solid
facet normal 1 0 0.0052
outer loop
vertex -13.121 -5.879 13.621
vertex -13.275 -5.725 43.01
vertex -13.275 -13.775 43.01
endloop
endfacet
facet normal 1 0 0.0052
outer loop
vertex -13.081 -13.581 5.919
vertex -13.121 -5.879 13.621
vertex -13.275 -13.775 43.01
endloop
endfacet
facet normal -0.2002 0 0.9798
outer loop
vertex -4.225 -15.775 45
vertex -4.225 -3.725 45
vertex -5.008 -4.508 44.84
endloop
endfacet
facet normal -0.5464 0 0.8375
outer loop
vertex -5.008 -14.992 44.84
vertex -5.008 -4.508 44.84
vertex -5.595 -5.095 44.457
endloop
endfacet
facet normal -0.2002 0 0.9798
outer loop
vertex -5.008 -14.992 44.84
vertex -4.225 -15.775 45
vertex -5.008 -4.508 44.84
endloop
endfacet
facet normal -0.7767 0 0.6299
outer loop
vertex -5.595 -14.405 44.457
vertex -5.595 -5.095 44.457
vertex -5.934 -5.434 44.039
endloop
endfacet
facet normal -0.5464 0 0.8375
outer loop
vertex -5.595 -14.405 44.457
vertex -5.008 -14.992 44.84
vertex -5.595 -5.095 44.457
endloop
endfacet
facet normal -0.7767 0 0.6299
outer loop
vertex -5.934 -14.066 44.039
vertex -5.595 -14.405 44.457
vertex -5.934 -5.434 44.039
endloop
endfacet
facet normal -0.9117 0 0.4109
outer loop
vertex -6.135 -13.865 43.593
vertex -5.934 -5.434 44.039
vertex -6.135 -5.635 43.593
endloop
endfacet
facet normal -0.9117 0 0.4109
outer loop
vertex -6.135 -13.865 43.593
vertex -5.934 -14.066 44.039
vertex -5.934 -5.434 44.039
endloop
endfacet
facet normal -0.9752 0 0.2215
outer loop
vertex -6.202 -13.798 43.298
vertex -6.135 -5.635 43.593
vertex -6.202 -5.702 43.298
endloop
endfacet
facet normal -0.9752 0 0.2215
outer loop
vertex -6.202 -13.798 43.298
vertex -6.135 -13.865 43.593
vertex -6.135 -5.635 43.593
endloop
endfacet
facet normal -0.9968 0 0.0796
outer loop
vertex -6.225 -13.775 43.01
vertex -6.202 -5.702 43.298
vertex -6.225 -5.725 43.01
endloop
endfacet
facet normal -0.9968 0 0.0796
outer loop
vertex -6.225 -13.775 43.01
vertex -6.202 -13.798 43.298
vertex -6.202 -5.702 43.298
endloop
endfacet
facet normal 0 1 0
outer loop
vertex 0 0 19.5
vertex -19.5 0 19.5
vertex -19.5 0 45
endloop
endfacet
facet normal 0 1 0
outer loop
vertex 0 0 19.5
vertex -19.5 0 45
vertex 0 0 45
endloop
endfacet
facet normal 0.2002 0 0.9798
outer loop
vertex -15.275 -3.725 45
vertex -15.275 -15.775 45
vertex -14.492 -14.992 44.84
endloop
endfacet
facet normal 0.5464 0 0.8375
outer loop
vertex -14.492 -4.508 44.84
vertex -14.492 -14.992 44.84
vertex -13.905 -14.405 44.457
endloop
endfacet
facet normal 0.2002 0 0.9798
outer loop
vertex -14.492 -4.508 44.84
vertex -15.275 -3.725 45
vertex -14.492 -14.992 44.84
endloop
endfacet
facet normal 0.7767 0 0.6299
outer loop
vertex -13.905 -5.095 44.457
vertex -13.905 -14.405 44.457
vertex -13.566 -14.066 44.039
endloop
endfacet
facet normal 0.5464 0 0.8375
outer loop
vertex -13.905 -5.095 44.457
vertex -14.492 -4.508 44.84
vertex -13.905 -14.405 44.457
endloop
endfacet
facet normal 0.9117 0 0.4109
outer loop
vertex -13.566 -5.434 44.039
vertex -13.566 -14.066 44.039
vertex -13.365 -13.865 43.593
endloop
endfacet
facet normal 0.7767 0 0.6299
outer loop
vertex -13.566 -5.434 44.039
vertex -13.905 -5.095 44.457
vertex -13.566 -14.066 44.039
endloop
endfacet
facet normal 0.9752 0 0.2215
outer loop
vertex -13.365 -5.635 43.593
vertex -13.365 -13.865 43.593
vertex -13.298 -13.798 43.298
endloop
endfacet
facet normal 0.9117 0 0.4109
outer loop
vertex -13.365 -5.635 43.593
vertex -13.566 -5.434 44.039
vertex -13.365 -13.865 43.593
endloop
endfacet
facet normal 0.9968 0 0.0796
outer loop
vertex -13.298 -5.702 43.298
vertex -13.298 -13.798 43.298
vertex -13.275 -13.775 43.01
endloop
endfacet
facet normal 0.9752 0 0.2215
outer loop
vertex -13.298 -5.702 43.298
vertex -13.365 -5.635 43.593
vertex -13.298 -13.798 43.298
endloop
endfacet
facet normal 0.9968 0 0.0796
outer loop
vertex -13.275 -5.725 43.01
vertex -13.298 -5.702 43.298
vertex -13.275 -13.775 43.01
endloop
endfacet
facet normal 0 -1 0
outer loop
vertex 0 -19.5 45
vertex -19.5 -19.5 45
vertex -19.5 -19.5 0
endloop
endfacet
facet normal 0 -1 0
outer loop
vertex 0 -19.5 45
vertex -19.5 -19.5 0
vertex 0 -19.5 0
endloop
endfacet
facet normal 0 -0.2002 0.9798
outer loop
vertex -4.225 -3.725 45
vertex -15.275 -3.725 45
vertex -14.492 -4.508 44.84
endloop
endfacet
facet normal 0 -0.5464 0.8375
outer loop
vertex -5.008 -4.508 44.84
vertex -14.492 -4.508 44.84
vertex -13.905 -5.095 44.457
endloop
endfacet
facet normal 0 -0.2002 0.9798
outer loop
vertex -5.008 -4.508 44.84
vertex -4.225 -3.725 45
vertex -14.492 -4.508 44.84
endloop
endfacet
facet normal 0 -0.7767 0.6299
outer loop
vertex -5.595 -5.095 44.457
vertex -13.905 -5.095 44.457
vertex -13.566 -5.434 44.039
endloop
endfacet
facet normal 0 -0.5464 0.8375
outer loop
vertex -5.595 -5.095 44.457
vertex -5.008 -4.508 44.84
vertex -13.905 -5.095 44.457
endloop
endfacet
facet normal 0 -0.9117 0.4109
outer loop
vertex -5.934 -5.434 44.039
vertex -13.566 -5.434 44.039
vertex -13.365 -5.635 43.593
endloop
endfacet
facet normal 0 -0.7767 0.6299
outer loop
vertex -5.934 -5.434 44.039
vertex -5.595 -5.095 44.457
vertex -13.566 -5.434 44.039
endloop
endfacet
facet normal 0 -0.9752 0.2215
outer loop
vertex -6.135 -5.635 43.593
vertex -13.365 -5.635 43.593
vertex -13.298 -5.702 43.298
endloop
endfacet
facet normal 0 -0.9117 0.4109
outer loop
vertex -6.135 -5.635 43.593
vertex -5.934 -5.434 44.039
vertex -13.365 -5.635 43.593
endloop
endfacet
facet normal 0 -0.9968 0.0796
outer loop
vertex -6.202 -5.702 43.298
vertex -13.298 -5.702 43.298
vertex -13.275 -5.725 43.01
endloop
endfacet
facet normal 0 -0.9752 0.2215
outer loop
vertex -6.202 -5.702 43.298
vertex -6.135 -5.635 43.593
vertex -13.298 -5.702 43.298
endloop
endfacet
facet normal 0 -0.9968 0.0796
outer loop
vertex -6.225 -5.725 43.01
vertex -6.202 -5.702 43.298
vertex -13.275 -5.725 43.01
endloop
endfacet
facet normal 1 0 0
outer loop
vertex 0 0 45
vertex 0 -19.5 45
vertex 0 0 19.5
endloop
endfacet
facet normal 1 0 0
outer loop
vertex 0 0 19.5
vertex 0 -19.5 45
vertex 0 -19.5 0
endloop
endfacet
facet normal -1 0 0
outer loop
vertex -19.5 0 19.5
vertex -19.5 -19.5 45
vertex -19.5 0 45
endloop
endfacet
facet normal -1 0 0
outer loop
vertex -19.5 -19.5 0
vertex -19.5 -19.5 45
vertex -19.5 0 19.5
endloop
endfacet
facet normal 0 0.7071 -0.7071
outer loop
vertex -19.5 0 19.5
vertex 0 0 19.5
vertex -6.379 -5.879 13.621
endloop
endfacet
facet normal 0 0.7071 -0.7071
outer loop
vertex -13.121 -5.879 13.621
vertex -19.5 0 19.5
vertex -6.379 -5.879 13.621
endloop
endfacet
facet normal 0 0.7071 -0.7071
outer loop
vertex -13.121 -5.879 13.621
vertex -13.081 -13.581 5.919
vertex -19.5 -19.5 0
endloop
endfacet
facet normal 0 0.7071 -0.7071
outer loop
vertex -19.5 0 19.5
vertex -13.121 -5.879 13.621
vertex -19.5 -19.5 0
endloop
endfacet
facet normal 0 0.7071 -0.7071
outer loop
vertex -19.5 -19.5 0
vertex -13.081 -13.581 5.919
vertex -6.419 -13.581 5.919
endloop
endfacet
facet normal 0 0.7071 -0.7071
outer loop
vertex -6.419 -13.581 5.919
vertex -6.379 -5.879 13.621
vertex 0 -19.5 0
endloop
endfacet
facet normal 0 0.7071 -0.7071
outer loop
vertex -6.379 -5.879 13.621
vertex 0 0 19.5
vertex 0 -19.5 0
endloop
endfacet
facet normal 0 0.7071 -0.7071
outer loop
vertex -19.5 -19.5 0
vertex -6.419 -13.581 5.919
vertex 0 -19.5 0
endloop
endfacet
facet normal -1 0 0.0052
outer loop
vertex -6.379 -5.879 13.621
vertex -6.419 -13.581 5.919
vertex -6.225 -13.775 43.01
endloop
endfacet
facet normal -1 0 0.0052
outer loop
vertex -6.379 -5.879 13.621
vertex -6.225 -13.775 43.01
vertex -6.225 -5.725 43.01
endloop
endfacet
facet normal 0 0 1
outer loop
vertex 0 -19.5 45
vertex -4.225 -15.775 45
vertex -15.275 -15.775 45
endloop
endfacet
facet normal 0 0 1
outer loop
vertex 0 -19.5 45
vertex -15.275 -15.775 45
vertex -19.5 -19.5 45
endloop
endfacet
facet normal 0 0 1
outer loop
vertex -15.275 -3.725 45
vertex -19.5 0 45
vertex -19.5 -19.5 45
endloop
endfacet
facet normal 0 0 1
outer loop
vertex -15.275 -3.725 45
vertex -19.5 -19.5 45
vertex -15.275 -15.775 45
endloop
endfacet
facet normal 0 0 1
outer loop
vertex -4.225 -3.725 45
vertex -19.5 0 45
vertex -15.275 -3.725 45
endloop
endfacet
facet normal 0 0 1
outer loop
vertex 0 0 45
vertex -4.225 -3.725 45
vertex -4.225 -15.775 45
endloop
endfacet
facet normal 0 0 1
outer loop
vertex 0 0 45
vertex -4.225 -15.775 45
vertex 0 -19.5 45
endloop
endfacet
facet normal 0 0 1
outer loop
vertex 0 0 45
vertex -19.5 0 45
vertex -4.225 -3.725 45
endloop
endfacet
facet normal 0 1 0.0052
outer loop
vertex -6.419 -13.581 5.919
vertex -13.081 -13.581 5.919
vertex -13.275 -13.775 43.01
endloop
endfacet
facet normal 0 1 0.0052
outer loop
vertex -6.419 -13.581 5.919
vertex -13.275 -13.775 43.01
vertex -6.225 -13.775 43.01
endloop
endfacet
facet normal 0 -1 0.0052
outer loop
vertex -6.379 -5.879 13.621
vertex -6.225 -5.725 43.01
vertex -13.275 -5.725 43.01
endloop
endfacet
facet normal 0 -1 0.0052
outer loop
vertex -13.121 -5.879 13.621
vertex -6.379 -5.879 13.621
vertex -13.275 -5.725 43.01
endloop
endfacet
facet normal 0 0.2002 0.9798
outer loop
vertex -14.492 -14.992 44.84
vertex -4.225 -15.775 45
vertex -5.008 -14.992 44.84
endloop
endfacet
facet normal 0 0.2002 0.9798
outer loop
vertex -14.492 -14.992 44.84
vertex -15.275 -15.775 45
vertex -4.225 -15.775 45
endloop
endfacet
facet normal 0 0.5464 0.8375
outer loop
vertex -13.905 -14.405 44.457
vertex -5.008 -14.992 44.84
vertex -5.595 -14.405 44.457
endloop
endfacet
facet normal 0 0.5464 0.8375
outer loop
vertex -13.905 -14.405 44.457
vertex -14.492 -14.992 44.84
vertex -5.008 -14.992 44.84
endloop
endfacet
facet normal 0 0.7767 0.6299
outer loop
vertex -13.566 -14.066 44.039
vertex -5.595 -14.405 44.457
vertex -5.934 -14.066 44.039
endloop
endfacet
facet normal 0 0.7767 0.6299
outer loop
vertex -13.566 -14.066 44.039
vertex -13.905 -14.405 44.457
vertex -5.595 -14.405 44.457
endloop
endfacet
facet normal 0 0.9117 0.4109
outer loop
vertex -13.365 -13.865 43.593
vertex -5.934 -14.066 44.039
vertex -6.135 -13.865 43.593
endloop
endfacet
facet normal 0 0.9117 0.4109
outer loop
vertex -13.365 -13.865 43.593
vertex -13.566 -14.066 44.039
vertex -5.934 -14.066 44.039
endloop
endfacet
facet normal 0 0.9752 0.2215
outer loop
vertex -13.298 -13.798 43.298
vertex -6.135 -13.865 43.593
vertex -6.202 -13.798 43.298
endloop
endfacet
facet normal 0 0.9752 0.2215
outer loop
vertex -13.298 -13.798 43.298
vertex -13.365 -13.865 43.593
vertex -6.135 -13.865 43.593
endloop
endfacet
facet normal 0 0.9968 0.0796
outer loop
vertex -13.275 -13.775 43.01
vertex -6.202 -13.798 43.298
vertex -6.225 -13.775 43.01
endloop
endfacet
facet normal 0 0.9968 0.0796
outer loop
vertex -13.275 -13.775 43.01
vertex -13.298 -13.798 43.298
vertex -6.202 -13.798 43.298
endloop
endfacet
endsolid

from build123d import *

# Parameters (mm, degrees)
F0_W     = 19.5
F0_H     = 19.5
F0_W_2   = 6.6
F0_H_2   = 7.6
F1_DEPTH = 45
F3_DEPTH = 25
F4_W     = 6.6
F4_H     = 7.6
F5_DEPTH = 50
F5_TAPER = -0.3
F6_R     = 2


with BuildPart() as f1:
    # F0 (on Top) → F1 (new body)
    with BuildSketch(Plane.XY):
        with Locations((-9.75, -9.75)):
            Rectangle(F0_W, F0_H)
        with Locations((-9.75, -9.75)):
            Rectangle(F0_W_2, F0_H_2, mode=Mode.SUBTRACT)
    extrude(amount=F1_DEPTH)

    # F2 (on face) → F3 (cut)
    with BuildSketch(Plane.YZ):
        Polygon((0, 19.5), (-19.5, 0), (0, 0), align=None)
    extrude(amount=-F3_DEPTH, mode=Mode.SUBTRACT)

    # F4 (on Top) → F5 (cut)
    with BuildSketch(Plane.XY):
        with Locations((-9.75, -9.75)):
            Rectangle(F4_W, F4_H)
    extrude(amount=F5_DEPTH, taper=F5_TAPER, mode=Mode.SUBTRACT)

    # F6
    f6_edges = [f1.edges().sort_by_distance(p)[0] for p in [
        (-9.75, -5.714378, 45),
        (-13.285622, -9.75, 45),
        (-6.214378, -9.75, 45),
        (-9.75, -13.785622, 45),
    ]]
    fillet(f6_edges, radius=F6_R)


solid = f1.part
